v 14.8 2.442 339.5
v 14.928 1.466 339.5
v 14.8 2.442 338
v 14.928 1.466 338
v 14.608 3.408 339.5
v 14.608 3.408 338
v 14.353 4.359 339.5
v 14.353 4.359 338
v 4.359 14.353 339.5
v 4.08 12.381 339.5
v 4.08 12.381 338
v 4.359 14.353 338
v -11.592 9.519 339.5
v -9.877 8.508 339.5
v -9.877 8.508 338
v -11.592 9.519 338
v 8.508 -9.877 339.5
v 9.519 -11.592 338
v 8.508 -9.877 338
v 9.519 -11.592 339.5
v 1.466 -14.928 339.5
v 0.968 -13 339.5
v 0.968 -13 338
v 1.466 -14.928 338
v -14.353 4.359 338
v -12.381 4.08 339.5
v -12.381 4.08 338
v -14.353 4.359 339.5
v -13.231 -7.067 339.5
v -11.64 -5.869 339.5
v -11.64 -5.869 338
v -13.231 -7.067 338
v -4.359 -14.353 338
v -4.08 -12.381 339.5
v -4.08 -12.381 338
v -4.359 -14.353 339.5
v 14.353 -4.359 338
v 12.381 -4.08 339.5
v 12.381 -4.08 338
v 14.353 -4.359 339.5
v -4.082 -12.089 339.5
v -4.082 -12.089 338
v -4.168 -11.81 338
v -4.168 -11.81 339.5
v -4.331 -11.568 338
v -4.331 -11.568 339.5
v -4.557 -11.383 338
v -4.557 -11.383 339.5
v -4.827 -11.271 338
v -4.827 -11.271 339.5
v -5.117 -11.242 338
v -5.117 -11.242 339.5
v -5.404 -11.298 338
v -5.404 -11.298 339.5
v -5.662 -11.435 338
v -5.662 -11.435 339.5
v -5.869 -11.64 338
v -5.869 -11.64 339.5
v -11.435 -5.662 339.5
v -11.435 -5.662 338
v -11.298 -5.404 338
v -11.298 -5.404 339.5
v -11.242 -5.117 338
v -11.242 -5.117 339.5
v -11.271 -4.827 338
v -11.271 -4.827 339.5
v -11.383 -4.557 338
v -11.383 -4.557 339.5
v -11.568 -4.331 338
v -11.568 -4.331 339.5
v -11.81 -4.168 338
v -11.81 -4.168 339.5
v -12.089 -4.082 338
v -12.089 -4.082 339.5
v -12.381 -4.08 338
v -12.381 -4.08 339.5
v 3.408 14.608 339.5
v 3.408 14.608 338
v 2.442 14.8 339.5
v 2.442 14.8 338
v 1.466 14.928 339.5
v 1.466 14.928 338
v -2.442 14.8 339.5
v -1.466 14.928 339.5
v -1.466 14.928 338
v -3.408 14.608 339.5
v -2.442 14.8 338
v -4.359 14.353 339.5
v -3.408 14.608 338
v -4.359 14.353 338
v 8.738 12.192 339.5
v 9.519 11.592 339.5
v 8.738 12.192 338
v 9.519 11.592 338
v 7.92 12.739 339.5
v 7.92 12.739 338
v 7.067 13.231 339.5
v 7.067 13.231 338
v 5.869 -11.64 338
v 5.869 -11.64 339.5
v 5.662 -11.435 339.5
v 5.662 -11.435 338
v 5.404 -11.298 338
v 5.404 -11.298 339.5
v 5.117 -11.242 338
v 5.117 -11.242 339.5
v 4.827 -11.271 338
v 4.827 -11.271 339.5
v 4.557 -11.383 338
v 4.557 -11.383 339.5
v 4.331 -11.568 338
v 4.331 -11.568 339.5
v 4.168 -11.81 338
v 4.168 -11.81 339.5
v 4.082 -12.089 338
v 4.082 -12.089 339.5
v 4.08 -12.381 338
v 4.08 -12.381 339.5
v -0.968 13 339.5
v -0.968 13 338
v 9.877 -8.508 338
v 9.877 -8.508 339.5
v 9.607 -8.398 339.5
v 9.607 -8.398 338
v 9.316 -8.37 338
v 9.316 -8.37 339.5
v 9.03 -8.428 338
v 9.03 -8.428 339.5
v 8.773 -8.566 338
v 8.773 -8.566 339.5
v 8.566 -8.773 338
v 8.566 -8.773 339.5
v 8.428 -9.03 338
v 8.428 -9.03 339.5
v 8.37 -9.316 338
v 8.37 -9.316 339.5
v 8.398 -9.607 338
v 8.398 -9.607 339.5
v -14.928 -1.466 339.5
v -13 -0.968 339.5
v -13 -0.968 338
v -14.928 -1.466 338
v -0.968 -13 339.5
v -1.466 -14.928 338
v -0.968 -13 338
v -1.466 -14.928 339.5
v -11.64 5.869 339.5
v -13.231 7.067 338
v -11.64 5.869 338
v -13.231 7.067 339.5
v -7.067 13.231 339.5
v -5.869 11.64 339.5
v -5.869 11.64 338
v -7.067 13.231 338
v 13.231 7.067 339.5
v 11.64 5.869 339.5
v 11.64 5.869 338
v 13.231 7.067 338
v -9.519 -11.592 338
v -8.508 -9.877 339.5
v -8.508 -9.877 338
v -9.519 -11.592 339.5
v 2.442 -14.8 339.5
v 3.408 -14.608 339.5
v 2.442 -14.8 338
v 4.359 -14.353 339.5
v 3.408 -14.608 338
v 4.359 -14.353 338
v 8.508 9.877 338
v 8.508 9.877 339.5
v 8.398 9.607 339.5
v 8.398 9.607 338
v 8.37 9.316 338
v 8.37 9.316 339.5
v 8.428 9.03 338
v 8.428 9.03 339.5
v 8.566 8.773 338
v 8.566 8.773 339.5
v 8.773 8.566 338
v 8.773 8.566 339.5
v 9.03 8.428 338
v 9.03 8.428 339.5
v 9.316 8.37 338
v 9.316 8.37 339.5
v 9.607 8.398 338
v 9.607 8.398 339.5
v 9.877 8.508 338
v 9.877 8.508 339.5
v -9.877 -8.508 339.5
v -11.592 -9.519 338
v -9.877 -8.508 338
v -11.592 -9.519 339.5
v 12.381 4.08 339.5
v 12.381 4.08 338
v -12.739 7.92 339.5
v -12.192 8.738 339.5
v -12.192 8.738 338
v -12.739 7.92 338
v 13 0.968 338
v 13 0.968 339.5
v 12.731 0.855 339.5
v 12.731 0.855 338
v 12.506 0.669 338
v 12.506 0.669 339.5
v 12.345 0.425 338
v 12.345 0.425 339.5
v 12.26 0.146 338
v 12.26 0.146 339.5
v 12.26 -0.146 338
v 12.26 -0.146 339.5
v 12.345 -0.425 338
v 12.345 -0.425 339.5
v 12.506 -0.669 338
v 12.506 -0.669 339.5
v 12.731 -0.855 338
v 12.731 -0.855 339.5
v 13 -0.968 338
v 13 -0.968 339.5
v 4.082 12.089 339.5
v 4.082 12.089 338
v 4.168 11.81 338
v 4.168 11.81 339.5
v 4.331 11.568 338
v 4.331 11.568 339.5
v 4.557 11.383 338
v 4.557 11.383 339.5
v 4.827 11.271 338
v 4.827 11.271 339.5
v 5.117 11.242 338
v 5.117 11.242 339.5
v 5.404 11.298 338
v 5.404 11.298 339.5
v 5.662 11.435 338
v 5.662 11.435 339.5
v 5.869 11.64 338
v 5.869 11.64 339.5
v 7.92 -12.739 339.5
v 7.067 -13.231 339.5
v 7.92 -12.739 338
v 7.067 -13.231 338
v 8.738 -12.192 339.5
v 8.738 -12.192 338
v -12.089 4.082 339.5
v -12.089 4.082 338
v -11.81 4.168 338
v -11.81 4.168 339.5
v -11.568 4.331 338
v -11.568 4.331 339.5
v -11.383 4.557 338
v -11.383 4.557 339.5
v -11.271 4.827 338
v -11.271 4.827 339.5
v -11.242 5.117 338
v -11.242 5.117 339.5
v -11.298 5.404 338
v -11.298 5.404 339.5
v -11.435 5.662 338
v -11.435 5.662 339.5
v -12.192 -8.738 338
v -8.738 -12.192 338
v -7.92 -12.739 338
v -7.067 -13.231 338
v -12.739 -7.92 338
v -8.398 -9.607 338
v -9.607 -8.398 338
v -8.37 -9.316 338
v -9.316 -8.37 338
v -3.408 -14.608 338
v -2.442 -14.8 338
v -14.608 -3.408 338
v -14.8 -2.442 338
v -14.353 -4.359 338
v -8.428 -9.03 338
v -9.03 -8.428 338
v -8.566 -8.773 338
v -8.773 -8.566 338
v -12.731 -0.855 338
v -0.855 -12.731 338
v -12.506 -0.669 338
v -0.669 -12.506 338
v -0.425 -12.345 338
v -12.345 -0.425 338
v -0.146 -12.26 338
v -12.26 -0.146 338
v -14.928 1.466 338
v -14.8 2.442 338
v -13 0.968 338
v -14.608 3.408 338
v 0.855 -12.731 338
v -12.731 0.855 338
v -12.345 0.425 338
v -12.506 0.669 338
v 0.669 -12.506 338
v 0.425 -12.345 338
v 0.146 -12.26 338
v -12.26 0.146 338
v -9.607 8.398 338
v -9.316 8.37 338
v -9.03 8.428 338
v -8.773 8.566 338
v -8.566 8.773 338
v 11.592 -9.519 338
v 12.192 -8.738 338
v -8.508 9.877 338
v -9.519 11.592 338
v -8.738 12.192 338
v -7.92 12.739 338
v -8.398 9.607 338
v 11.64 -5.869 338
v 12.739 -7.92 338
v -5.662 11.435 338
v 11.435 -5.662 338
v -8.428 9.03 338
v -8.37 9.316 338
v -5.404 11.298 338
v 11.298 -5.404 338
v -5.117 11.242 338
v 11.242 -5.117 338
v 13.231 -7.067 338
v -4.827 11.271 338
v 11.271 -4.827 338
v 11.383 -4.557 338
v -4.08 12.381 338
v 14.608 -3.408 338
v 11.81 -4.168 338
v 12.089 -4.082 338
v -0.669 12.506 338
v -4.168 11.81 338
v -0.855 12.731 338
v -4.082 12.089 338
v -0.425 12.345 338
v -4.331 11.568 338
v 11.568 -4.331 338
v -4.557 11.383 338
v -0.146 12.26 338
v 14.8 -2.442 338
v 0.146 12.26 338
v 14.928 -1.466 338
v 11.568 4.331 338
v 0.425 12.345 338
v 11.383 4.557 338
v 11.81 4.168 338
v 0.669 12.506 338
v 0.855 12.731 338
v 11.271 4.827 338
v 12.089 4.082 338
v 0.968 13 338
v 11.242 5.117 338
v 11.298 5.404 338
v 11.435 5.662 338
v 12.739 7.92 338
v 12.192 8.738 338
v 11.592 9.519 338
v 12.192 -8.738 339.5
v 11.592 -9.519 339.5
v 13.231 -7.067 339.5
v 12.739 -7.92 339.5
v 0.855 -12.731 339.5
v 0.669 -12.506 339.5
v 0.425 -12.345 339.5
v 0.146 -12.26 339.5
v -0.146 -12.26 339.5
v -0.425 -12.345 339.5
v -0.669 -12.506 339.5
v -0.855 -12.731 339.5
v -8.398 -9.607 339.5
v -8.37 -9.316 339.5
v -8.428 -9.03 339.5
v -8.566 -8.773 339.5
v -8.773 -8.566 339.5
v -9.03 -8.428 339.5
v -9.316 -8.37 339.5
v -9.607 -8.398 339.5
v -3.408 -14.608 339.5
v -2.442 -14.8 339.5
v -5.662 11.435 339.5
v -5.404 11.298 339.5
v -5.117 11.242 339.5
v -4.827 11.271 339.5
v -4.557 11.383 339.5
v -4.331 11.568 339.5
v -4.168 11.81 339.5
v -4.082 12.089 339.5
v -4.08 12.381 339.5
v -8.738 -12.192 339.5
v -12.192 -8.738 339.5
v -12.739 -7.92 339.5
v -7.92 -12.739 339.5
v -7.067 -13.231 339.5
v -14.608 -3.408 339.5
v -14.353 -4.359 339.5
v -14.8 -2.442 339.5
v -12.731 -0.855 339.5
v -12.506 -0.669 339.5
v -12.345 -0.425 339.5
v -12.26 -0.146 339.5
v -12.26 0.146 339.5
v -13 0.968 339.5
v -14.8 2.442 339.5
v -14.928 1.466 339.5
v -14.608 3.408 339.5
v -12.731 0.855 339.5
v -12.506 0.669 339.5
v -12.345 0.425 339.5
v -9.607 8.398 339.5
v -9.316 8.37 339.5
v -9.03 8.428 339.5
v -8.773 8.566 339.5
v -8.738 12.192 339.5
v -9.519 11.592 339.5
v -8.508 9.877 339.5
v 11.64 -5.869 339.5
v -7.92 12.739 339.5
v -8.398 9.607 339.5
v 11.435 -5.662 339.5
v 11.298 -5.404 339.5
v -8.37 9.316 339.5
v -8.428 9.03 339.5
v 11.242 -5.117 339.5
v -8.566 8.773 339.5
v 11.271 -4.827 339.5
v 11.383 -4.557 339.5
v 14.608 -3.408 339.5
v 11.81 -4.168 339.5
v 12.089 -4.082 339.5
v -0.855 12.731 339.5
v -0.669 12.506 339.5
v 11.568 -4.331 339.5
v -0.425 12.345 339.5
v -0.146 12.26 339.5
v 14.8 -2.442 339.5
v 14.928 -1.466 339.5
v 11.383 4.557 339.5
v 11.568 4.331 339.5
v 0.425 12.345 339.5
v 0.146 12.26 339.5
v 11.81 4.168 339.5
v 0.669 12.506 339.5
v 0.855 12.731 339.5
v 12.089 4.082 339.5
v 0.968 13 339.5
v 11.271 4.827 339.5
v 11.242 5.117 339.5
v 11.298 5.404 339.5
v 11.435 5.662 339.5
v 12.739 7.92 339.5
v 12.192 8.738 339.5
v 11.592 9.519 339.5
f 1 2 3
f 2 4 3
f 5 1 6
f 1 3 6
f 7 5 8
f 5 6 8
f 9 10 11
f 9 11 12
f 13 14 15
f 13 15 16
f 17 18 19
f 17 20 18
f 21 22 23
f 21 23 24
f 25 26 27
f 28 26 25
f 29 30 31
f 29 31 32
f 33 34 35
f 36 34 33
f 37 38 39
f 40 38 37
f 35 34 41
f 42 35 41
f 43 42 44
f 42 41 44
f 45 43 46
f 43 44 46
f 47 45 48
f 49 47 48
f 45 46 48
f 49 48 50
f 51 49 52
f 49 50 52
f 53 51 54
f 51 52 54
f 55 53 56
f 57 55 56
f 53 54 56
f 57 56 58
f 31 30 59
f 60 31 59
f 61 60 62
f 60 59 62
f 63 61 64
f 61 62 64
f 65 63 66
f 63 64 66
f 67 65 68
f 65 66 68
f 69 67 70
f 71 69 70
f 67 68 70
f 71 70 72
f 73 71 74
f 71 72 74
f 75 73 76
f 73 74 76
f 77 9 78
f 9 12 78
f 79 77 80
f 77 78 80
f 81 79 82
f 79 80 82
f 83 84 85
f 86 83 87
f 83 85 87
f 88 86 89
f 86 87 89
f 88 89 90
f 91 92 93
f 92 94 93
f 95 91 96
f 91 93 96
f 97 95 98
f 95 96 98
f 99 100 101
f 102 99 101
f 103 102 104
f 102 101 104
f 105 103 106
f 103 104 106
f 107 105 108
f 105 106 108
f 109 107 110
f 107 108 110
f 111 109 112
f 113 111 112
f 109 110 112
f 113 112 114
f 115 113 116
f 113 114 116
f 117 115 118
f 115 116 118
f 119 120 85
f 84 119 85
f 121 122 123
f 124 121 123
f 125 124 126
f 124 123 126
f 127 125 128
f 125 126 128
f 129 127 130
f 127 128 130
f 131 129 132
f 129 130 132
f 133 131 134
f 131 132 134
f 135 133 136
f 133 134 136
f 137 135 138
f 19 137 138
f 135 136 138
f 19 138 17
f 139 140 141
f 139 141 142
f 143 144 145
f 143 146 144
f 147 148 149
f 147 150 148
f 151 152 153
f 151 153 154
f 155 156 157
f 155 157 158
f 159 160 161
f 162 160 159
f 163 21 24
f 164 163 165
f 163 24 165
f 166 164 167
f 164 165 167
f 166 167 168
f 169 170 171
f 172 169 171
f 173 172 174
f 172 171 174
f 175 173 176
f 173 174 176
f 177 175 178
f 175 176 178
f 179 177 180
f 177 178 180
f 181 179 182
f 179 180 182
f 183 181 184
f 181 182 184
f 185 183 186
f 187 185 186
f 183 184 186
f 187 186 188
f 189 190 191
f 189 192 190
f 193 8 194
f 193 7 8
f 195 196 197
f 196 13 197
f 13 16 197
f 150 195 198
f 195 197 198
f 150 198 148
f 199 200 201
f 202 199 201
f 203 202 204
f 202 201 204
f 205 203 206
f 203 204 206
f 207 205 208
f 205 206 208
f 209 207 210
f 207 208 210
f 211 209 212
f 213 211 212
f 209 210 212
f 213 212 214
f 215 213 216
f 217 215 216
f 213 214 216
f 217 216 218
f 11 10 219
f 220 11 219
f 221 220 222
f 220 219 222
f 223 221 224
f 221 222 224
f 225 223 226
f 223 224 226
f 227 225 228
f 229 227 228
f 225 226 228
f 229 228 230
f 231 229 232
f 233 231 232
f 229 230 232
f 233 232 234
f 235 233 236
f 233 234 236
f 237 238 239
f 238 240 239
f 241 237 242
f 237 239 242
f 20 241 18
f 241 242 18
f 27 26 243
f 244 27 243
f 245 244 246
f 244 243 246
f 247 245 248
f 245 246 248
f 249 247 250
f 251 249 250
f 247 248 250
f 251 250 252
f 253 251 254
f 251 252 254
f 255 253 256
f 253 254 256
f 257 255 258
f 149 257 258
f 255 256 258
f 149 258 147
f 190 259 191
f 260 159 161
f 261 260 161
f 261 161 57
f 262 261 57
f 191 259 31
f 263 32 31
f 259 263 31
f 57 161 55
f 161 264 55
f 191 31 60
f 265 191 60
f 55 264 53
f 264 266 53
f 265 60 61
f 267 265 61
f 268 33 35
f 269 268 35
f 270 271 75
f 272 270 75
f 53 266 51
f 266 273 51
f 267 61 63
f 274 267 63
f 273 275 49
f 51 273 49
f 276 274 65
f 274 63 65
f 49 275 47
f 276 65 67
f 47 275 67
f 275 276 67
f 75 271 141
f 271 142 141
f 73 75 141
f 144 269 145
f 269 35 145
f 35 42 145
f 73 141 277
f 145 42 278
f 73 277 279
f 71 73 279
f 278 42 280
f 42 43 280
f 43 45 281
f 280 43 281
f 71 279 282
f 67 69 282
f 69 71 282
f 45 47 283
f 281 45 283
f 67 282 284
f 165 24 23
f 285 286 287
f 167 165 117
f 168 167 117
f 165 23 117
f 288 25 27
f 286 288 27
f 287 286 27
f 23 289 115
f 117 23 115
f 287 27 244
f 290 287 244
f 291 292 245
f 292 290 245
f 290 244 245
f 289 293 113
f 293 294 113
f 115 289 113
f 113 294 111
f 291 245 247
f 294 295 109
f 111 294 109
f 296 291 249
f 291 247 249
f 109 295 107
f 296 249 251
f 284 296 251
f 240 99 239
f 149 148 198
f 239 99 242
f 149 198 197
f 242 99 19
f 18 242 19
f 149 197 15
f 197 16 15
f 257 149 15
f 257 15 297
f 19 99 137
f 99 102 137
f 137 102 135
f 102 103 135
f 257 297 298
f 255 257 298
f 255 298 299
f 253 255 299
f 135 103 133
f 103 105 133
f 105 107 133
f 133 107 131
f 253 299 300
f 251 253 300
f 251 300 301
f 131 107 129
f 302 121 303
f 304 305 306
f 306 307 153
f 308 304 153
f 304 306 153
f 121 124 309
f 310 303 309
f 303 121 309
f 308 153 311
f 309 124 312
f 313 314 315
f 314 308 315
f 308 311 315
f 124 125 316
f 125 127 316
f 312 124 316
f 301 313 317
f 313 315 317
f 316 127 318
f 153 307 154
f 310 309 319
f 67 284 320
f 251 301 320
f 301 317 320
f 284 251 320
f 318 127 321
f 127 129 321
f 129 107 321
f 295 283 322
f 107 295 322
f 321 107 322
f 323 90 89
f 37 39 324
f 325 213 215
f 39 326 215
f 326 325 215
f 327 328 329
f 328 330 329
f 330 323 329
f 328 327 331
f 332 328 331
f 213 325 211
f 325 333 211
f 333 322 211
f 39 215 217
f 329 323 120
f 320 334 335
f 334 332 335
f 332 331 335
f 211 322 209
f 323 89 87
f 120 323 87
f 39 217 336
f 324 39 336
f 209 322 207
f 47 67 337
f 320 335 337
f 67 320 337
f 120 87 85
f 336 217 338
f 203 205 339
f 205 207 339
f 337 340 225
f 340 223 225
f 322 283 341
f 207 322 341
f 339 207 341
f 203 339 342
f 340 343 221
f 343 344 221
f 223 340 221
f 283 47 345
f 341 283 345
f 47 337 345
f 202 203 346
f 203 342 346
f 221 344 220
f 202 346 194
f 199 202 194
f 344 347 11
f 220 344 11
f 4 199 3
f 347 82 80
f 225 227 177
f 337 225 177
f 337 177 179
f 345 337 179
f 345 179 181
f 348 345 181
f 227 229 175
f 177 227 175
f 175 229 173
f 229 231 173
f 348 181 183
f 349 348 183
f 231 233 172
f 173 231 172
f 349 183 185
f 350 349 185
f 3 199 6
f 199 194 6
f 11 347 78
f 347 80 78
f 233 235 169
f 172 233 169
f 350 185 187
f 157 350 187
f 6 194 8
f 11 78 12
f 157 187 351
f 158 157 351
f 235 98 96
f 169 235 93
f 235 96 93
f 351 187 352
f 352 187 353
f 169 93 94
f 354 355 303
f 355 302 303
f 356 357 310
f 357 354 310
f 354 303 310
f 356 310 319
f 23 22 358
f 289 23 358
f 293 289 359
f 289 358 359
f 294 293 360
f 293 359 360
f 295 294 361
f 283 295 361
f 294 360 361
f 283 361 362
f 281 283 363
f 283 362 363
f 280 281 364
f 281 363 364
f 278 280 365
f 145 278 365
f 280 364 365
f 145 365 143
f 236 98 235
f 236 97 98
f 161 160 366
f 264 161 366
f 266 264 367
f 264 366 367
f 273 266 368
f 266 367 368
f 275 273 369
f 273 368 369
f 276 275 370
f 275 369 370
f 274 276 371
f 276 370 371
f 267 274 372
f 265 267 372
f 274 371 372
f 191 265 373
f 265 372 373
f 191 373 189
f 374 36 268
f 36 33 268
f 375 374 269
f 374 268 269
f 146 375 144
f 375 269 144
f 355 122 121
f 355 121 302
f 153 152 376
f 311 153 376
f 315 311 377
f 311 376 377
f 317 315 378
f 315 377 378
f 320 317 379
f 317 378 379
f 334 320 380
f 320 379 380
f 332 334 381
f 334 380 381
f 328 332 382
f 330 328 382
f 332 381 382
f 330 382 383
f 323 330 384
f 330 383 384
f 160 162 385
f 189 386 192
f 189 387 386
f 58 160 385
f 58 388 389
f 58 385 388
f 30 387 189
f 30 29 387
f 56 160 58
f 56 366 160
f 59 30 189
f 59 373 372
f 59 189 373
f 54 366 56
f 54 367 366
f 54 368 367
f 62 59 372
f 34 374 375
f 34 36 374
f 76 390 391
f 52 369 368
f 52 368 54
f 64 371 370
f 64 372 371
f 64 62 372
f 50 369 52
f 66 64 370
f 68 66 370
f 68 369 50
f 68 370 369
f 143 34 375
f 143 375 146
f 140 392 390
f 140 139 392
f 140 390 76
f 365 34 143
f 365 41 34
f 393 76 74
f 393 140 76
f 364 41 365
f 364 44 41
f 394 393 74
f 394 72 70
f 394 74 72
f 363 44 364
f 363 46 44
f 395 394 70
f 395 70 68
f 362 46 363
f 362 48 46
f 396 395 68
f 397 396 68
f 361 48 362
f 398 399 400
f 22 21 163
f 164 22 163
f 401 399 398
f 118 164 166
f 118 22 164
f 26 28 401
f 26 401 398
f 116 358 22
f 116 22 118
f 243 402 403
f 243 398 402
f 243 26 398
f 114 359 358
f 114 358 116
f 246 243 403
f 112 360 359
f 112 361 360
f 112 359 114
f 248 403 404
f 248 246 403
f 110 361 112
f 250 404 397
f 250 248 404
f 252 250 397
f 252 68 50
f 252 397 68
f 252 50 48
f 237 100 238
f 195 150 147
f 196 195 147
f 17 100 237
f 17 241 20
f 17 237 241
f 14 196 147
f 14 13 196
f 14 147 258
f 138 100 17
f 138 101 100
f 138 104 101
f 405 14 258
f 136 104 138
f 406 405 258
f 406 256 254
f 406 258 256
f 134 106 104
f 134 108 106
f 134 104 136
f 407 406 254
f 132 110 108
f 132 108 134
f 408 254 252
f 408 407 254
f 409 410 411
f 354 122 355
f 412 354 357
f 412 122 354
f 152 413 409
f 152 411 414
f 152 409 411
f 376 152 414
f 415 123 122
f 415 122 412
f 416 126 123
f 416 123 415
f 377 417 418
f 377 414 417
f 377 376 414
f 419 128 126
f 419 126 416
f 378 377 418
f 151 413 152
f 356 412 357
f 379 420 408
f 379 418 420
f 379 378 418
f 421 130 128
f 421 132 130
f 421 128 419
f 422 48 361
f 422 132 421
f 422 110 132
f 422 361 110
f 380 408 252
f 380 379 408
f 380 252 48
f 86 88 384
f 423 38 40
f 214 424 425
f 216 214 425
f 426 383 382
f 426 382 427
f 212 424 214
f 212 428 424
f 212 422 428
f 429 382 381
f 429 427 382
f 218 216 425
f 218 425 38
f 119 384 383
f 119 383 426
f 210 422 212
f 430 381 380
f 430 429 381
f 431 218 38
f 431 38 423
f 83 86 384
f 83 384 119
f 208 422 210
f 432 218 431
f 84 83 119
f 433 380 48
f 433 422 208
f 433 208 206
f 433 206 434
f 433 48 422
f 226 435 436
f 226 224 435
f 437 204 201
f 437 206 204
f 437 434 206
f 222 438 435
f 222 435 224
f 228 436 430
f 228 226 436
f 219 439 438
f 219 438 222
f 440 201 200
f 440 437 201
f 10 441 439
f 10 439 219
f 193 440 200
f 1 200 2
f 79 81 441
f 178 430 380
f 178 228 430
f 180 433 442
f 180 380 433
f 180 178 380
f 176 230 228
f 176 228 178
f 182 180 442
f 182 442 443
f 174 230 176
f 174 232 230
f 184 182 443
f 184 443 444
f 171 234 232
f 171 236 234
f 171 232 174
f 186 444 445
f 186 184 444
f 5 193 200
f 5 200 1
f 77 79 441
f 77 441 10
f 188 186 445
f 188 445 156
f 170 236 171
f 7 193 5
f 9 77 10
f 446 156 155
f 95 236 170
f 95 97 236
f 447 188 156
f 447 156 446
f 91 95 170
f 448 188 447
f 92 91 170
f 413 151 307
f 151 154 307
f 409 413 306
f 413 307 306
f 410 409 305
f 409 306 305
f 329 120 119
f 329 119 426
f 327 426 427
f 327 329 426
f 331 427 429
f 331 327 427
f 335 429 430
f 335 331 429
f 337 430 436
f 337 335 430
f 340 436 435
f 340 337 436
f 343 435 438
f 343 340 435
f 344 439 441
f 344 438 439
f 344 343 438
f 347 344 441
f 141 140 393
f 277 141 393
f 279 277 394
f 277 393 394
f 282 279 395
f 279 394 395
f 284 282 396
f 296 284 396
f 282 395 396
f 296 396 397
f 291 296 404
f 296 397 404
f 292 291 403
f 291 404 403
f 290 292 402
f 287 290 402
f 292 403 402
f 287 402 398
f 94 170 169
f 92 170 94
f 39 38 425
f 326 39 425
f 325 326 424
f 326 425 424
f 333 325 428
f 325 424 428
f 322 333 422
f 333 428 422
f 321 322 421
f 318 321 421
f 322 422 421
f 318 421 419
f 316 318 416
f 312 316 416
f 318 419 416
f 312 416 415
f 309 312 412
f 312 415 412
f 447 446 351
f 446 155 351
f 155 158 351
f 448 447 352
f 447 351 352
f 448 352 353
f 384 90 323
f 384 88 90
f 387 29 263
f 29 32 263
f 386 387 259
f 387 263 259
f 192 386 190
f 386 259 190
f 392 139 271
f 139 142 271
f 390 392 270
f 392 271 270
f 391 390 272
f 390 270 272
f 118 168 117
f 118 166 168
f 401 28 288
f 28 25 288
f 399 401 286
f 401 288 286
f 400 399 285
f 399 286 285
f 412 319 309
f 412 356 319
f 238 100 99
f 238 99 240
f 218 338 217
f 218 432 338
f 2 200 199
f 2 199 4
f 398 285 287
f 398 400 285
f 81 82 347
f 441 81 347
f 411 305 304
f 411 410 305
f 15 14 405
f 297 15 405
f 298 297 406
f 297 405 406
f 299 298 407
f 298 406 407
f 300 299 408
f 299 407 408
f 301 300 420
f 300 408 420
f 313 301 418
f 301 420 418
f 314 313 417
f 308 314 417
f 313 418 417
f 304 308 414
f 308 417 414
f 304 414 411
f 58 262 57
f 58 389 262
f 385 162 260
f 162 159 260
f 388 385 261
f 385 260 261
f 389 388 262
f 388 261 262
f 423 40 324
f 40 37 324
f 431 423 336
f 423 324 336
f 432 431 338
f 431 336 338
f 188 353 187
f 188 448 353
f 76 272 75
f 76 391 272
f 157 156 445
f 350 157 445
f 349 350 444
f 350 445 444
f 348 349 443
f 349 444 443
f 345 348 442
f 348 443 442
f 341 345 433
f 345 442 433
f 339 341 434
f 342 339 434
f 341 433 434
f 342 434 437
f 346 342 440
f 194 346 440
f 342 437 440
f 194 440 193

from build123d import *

# Parameters (mm, degrees)
SKETCH012_R        = 15
PAD010_DEPTH       = 1.5
POCKET_DEPTH       = 84.90683
POCKET_DEPTH_BACK  = 86.40683
POLARPATTERN_COUNT = 16


with BuildPart() as part:
    # Sketch012 → Pad010 (new body)
    with BuildSketch(Plane.XY):
        Circle(SKETCH012_R)
    extrude(amount=PAD010_DEPTH)

    # Sketch013 → Pocket (cut, two sides)
    with BuildSketch(Plane.XY) as pocket_sk:
        with BuildLine():
            Line((-2, 17), (2, 17))
            Line((2, 17), (0.968311, 13))
            ThreePointArc((-0.968311, 13), (0, 12.249749), (0.968311, 13))
            Line((-0.968311, 13), (-2, 17))
        make_face()
    pocket = extrude(amount=-POCKET_DEPTH, mode=Mode.SUBTRACT) + extrude(pocket_sk.sketch, amount=POCKET_DEPTH_BACK, mode=Mode.SUBTRACT)

    # PolarPattern: Pocket ×16 about axis
    polarpattern_axis = Axis((0, 0, 0), (0, 0, 1))
    for i in range(1, POLARPATTERN_COUNT):
        add(pocket.rotate(polarpattern_axis, i * 360 / POLARPATTERN_COUNT), mode=Mode.SUBTRACT)


with BuildPart() as part_1:
    # Body011 placement: moved
    add(part.part.moved(Location((0, 0, 338))))


solid = part_1.part
